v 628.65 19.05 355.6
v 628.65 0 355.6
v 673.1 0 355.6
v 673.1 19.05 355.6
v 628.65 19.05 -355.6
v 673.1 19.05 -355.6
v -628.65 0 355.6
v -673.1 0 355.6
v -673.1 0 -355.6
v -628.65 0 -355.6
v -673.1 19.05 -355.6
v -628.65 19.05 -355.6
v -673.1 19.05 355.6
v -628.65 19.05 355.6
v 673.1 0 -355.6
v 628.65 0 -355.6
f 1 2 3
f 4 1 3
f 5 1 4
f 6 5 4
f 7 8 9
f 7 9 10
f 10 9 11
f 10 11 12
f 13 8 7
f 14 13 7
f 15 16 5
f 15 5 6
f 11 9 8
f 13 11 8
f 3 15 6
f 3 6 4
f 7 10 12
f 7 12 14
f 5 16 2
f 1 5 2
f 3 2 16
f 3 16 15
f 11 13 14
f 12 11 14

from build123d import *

# Parameters (mm, degrees)
F0_W     = 44.45
F0_H     = 711.2
F1_DEPTH = 19.05


with BuildPart() as f1:
    # F0 (on Front) → F1 (new body)
    with BuildSketch(Plane.XZ):
        with Locations((650.875, 0)):
            Rectangle(F0_W, F0_H)
        with Locations((-650.875, 0)):
            Rectangle(F0_W, F0_H)
    extrude(amount=-F1_DEPTH)


solid = f1.part
